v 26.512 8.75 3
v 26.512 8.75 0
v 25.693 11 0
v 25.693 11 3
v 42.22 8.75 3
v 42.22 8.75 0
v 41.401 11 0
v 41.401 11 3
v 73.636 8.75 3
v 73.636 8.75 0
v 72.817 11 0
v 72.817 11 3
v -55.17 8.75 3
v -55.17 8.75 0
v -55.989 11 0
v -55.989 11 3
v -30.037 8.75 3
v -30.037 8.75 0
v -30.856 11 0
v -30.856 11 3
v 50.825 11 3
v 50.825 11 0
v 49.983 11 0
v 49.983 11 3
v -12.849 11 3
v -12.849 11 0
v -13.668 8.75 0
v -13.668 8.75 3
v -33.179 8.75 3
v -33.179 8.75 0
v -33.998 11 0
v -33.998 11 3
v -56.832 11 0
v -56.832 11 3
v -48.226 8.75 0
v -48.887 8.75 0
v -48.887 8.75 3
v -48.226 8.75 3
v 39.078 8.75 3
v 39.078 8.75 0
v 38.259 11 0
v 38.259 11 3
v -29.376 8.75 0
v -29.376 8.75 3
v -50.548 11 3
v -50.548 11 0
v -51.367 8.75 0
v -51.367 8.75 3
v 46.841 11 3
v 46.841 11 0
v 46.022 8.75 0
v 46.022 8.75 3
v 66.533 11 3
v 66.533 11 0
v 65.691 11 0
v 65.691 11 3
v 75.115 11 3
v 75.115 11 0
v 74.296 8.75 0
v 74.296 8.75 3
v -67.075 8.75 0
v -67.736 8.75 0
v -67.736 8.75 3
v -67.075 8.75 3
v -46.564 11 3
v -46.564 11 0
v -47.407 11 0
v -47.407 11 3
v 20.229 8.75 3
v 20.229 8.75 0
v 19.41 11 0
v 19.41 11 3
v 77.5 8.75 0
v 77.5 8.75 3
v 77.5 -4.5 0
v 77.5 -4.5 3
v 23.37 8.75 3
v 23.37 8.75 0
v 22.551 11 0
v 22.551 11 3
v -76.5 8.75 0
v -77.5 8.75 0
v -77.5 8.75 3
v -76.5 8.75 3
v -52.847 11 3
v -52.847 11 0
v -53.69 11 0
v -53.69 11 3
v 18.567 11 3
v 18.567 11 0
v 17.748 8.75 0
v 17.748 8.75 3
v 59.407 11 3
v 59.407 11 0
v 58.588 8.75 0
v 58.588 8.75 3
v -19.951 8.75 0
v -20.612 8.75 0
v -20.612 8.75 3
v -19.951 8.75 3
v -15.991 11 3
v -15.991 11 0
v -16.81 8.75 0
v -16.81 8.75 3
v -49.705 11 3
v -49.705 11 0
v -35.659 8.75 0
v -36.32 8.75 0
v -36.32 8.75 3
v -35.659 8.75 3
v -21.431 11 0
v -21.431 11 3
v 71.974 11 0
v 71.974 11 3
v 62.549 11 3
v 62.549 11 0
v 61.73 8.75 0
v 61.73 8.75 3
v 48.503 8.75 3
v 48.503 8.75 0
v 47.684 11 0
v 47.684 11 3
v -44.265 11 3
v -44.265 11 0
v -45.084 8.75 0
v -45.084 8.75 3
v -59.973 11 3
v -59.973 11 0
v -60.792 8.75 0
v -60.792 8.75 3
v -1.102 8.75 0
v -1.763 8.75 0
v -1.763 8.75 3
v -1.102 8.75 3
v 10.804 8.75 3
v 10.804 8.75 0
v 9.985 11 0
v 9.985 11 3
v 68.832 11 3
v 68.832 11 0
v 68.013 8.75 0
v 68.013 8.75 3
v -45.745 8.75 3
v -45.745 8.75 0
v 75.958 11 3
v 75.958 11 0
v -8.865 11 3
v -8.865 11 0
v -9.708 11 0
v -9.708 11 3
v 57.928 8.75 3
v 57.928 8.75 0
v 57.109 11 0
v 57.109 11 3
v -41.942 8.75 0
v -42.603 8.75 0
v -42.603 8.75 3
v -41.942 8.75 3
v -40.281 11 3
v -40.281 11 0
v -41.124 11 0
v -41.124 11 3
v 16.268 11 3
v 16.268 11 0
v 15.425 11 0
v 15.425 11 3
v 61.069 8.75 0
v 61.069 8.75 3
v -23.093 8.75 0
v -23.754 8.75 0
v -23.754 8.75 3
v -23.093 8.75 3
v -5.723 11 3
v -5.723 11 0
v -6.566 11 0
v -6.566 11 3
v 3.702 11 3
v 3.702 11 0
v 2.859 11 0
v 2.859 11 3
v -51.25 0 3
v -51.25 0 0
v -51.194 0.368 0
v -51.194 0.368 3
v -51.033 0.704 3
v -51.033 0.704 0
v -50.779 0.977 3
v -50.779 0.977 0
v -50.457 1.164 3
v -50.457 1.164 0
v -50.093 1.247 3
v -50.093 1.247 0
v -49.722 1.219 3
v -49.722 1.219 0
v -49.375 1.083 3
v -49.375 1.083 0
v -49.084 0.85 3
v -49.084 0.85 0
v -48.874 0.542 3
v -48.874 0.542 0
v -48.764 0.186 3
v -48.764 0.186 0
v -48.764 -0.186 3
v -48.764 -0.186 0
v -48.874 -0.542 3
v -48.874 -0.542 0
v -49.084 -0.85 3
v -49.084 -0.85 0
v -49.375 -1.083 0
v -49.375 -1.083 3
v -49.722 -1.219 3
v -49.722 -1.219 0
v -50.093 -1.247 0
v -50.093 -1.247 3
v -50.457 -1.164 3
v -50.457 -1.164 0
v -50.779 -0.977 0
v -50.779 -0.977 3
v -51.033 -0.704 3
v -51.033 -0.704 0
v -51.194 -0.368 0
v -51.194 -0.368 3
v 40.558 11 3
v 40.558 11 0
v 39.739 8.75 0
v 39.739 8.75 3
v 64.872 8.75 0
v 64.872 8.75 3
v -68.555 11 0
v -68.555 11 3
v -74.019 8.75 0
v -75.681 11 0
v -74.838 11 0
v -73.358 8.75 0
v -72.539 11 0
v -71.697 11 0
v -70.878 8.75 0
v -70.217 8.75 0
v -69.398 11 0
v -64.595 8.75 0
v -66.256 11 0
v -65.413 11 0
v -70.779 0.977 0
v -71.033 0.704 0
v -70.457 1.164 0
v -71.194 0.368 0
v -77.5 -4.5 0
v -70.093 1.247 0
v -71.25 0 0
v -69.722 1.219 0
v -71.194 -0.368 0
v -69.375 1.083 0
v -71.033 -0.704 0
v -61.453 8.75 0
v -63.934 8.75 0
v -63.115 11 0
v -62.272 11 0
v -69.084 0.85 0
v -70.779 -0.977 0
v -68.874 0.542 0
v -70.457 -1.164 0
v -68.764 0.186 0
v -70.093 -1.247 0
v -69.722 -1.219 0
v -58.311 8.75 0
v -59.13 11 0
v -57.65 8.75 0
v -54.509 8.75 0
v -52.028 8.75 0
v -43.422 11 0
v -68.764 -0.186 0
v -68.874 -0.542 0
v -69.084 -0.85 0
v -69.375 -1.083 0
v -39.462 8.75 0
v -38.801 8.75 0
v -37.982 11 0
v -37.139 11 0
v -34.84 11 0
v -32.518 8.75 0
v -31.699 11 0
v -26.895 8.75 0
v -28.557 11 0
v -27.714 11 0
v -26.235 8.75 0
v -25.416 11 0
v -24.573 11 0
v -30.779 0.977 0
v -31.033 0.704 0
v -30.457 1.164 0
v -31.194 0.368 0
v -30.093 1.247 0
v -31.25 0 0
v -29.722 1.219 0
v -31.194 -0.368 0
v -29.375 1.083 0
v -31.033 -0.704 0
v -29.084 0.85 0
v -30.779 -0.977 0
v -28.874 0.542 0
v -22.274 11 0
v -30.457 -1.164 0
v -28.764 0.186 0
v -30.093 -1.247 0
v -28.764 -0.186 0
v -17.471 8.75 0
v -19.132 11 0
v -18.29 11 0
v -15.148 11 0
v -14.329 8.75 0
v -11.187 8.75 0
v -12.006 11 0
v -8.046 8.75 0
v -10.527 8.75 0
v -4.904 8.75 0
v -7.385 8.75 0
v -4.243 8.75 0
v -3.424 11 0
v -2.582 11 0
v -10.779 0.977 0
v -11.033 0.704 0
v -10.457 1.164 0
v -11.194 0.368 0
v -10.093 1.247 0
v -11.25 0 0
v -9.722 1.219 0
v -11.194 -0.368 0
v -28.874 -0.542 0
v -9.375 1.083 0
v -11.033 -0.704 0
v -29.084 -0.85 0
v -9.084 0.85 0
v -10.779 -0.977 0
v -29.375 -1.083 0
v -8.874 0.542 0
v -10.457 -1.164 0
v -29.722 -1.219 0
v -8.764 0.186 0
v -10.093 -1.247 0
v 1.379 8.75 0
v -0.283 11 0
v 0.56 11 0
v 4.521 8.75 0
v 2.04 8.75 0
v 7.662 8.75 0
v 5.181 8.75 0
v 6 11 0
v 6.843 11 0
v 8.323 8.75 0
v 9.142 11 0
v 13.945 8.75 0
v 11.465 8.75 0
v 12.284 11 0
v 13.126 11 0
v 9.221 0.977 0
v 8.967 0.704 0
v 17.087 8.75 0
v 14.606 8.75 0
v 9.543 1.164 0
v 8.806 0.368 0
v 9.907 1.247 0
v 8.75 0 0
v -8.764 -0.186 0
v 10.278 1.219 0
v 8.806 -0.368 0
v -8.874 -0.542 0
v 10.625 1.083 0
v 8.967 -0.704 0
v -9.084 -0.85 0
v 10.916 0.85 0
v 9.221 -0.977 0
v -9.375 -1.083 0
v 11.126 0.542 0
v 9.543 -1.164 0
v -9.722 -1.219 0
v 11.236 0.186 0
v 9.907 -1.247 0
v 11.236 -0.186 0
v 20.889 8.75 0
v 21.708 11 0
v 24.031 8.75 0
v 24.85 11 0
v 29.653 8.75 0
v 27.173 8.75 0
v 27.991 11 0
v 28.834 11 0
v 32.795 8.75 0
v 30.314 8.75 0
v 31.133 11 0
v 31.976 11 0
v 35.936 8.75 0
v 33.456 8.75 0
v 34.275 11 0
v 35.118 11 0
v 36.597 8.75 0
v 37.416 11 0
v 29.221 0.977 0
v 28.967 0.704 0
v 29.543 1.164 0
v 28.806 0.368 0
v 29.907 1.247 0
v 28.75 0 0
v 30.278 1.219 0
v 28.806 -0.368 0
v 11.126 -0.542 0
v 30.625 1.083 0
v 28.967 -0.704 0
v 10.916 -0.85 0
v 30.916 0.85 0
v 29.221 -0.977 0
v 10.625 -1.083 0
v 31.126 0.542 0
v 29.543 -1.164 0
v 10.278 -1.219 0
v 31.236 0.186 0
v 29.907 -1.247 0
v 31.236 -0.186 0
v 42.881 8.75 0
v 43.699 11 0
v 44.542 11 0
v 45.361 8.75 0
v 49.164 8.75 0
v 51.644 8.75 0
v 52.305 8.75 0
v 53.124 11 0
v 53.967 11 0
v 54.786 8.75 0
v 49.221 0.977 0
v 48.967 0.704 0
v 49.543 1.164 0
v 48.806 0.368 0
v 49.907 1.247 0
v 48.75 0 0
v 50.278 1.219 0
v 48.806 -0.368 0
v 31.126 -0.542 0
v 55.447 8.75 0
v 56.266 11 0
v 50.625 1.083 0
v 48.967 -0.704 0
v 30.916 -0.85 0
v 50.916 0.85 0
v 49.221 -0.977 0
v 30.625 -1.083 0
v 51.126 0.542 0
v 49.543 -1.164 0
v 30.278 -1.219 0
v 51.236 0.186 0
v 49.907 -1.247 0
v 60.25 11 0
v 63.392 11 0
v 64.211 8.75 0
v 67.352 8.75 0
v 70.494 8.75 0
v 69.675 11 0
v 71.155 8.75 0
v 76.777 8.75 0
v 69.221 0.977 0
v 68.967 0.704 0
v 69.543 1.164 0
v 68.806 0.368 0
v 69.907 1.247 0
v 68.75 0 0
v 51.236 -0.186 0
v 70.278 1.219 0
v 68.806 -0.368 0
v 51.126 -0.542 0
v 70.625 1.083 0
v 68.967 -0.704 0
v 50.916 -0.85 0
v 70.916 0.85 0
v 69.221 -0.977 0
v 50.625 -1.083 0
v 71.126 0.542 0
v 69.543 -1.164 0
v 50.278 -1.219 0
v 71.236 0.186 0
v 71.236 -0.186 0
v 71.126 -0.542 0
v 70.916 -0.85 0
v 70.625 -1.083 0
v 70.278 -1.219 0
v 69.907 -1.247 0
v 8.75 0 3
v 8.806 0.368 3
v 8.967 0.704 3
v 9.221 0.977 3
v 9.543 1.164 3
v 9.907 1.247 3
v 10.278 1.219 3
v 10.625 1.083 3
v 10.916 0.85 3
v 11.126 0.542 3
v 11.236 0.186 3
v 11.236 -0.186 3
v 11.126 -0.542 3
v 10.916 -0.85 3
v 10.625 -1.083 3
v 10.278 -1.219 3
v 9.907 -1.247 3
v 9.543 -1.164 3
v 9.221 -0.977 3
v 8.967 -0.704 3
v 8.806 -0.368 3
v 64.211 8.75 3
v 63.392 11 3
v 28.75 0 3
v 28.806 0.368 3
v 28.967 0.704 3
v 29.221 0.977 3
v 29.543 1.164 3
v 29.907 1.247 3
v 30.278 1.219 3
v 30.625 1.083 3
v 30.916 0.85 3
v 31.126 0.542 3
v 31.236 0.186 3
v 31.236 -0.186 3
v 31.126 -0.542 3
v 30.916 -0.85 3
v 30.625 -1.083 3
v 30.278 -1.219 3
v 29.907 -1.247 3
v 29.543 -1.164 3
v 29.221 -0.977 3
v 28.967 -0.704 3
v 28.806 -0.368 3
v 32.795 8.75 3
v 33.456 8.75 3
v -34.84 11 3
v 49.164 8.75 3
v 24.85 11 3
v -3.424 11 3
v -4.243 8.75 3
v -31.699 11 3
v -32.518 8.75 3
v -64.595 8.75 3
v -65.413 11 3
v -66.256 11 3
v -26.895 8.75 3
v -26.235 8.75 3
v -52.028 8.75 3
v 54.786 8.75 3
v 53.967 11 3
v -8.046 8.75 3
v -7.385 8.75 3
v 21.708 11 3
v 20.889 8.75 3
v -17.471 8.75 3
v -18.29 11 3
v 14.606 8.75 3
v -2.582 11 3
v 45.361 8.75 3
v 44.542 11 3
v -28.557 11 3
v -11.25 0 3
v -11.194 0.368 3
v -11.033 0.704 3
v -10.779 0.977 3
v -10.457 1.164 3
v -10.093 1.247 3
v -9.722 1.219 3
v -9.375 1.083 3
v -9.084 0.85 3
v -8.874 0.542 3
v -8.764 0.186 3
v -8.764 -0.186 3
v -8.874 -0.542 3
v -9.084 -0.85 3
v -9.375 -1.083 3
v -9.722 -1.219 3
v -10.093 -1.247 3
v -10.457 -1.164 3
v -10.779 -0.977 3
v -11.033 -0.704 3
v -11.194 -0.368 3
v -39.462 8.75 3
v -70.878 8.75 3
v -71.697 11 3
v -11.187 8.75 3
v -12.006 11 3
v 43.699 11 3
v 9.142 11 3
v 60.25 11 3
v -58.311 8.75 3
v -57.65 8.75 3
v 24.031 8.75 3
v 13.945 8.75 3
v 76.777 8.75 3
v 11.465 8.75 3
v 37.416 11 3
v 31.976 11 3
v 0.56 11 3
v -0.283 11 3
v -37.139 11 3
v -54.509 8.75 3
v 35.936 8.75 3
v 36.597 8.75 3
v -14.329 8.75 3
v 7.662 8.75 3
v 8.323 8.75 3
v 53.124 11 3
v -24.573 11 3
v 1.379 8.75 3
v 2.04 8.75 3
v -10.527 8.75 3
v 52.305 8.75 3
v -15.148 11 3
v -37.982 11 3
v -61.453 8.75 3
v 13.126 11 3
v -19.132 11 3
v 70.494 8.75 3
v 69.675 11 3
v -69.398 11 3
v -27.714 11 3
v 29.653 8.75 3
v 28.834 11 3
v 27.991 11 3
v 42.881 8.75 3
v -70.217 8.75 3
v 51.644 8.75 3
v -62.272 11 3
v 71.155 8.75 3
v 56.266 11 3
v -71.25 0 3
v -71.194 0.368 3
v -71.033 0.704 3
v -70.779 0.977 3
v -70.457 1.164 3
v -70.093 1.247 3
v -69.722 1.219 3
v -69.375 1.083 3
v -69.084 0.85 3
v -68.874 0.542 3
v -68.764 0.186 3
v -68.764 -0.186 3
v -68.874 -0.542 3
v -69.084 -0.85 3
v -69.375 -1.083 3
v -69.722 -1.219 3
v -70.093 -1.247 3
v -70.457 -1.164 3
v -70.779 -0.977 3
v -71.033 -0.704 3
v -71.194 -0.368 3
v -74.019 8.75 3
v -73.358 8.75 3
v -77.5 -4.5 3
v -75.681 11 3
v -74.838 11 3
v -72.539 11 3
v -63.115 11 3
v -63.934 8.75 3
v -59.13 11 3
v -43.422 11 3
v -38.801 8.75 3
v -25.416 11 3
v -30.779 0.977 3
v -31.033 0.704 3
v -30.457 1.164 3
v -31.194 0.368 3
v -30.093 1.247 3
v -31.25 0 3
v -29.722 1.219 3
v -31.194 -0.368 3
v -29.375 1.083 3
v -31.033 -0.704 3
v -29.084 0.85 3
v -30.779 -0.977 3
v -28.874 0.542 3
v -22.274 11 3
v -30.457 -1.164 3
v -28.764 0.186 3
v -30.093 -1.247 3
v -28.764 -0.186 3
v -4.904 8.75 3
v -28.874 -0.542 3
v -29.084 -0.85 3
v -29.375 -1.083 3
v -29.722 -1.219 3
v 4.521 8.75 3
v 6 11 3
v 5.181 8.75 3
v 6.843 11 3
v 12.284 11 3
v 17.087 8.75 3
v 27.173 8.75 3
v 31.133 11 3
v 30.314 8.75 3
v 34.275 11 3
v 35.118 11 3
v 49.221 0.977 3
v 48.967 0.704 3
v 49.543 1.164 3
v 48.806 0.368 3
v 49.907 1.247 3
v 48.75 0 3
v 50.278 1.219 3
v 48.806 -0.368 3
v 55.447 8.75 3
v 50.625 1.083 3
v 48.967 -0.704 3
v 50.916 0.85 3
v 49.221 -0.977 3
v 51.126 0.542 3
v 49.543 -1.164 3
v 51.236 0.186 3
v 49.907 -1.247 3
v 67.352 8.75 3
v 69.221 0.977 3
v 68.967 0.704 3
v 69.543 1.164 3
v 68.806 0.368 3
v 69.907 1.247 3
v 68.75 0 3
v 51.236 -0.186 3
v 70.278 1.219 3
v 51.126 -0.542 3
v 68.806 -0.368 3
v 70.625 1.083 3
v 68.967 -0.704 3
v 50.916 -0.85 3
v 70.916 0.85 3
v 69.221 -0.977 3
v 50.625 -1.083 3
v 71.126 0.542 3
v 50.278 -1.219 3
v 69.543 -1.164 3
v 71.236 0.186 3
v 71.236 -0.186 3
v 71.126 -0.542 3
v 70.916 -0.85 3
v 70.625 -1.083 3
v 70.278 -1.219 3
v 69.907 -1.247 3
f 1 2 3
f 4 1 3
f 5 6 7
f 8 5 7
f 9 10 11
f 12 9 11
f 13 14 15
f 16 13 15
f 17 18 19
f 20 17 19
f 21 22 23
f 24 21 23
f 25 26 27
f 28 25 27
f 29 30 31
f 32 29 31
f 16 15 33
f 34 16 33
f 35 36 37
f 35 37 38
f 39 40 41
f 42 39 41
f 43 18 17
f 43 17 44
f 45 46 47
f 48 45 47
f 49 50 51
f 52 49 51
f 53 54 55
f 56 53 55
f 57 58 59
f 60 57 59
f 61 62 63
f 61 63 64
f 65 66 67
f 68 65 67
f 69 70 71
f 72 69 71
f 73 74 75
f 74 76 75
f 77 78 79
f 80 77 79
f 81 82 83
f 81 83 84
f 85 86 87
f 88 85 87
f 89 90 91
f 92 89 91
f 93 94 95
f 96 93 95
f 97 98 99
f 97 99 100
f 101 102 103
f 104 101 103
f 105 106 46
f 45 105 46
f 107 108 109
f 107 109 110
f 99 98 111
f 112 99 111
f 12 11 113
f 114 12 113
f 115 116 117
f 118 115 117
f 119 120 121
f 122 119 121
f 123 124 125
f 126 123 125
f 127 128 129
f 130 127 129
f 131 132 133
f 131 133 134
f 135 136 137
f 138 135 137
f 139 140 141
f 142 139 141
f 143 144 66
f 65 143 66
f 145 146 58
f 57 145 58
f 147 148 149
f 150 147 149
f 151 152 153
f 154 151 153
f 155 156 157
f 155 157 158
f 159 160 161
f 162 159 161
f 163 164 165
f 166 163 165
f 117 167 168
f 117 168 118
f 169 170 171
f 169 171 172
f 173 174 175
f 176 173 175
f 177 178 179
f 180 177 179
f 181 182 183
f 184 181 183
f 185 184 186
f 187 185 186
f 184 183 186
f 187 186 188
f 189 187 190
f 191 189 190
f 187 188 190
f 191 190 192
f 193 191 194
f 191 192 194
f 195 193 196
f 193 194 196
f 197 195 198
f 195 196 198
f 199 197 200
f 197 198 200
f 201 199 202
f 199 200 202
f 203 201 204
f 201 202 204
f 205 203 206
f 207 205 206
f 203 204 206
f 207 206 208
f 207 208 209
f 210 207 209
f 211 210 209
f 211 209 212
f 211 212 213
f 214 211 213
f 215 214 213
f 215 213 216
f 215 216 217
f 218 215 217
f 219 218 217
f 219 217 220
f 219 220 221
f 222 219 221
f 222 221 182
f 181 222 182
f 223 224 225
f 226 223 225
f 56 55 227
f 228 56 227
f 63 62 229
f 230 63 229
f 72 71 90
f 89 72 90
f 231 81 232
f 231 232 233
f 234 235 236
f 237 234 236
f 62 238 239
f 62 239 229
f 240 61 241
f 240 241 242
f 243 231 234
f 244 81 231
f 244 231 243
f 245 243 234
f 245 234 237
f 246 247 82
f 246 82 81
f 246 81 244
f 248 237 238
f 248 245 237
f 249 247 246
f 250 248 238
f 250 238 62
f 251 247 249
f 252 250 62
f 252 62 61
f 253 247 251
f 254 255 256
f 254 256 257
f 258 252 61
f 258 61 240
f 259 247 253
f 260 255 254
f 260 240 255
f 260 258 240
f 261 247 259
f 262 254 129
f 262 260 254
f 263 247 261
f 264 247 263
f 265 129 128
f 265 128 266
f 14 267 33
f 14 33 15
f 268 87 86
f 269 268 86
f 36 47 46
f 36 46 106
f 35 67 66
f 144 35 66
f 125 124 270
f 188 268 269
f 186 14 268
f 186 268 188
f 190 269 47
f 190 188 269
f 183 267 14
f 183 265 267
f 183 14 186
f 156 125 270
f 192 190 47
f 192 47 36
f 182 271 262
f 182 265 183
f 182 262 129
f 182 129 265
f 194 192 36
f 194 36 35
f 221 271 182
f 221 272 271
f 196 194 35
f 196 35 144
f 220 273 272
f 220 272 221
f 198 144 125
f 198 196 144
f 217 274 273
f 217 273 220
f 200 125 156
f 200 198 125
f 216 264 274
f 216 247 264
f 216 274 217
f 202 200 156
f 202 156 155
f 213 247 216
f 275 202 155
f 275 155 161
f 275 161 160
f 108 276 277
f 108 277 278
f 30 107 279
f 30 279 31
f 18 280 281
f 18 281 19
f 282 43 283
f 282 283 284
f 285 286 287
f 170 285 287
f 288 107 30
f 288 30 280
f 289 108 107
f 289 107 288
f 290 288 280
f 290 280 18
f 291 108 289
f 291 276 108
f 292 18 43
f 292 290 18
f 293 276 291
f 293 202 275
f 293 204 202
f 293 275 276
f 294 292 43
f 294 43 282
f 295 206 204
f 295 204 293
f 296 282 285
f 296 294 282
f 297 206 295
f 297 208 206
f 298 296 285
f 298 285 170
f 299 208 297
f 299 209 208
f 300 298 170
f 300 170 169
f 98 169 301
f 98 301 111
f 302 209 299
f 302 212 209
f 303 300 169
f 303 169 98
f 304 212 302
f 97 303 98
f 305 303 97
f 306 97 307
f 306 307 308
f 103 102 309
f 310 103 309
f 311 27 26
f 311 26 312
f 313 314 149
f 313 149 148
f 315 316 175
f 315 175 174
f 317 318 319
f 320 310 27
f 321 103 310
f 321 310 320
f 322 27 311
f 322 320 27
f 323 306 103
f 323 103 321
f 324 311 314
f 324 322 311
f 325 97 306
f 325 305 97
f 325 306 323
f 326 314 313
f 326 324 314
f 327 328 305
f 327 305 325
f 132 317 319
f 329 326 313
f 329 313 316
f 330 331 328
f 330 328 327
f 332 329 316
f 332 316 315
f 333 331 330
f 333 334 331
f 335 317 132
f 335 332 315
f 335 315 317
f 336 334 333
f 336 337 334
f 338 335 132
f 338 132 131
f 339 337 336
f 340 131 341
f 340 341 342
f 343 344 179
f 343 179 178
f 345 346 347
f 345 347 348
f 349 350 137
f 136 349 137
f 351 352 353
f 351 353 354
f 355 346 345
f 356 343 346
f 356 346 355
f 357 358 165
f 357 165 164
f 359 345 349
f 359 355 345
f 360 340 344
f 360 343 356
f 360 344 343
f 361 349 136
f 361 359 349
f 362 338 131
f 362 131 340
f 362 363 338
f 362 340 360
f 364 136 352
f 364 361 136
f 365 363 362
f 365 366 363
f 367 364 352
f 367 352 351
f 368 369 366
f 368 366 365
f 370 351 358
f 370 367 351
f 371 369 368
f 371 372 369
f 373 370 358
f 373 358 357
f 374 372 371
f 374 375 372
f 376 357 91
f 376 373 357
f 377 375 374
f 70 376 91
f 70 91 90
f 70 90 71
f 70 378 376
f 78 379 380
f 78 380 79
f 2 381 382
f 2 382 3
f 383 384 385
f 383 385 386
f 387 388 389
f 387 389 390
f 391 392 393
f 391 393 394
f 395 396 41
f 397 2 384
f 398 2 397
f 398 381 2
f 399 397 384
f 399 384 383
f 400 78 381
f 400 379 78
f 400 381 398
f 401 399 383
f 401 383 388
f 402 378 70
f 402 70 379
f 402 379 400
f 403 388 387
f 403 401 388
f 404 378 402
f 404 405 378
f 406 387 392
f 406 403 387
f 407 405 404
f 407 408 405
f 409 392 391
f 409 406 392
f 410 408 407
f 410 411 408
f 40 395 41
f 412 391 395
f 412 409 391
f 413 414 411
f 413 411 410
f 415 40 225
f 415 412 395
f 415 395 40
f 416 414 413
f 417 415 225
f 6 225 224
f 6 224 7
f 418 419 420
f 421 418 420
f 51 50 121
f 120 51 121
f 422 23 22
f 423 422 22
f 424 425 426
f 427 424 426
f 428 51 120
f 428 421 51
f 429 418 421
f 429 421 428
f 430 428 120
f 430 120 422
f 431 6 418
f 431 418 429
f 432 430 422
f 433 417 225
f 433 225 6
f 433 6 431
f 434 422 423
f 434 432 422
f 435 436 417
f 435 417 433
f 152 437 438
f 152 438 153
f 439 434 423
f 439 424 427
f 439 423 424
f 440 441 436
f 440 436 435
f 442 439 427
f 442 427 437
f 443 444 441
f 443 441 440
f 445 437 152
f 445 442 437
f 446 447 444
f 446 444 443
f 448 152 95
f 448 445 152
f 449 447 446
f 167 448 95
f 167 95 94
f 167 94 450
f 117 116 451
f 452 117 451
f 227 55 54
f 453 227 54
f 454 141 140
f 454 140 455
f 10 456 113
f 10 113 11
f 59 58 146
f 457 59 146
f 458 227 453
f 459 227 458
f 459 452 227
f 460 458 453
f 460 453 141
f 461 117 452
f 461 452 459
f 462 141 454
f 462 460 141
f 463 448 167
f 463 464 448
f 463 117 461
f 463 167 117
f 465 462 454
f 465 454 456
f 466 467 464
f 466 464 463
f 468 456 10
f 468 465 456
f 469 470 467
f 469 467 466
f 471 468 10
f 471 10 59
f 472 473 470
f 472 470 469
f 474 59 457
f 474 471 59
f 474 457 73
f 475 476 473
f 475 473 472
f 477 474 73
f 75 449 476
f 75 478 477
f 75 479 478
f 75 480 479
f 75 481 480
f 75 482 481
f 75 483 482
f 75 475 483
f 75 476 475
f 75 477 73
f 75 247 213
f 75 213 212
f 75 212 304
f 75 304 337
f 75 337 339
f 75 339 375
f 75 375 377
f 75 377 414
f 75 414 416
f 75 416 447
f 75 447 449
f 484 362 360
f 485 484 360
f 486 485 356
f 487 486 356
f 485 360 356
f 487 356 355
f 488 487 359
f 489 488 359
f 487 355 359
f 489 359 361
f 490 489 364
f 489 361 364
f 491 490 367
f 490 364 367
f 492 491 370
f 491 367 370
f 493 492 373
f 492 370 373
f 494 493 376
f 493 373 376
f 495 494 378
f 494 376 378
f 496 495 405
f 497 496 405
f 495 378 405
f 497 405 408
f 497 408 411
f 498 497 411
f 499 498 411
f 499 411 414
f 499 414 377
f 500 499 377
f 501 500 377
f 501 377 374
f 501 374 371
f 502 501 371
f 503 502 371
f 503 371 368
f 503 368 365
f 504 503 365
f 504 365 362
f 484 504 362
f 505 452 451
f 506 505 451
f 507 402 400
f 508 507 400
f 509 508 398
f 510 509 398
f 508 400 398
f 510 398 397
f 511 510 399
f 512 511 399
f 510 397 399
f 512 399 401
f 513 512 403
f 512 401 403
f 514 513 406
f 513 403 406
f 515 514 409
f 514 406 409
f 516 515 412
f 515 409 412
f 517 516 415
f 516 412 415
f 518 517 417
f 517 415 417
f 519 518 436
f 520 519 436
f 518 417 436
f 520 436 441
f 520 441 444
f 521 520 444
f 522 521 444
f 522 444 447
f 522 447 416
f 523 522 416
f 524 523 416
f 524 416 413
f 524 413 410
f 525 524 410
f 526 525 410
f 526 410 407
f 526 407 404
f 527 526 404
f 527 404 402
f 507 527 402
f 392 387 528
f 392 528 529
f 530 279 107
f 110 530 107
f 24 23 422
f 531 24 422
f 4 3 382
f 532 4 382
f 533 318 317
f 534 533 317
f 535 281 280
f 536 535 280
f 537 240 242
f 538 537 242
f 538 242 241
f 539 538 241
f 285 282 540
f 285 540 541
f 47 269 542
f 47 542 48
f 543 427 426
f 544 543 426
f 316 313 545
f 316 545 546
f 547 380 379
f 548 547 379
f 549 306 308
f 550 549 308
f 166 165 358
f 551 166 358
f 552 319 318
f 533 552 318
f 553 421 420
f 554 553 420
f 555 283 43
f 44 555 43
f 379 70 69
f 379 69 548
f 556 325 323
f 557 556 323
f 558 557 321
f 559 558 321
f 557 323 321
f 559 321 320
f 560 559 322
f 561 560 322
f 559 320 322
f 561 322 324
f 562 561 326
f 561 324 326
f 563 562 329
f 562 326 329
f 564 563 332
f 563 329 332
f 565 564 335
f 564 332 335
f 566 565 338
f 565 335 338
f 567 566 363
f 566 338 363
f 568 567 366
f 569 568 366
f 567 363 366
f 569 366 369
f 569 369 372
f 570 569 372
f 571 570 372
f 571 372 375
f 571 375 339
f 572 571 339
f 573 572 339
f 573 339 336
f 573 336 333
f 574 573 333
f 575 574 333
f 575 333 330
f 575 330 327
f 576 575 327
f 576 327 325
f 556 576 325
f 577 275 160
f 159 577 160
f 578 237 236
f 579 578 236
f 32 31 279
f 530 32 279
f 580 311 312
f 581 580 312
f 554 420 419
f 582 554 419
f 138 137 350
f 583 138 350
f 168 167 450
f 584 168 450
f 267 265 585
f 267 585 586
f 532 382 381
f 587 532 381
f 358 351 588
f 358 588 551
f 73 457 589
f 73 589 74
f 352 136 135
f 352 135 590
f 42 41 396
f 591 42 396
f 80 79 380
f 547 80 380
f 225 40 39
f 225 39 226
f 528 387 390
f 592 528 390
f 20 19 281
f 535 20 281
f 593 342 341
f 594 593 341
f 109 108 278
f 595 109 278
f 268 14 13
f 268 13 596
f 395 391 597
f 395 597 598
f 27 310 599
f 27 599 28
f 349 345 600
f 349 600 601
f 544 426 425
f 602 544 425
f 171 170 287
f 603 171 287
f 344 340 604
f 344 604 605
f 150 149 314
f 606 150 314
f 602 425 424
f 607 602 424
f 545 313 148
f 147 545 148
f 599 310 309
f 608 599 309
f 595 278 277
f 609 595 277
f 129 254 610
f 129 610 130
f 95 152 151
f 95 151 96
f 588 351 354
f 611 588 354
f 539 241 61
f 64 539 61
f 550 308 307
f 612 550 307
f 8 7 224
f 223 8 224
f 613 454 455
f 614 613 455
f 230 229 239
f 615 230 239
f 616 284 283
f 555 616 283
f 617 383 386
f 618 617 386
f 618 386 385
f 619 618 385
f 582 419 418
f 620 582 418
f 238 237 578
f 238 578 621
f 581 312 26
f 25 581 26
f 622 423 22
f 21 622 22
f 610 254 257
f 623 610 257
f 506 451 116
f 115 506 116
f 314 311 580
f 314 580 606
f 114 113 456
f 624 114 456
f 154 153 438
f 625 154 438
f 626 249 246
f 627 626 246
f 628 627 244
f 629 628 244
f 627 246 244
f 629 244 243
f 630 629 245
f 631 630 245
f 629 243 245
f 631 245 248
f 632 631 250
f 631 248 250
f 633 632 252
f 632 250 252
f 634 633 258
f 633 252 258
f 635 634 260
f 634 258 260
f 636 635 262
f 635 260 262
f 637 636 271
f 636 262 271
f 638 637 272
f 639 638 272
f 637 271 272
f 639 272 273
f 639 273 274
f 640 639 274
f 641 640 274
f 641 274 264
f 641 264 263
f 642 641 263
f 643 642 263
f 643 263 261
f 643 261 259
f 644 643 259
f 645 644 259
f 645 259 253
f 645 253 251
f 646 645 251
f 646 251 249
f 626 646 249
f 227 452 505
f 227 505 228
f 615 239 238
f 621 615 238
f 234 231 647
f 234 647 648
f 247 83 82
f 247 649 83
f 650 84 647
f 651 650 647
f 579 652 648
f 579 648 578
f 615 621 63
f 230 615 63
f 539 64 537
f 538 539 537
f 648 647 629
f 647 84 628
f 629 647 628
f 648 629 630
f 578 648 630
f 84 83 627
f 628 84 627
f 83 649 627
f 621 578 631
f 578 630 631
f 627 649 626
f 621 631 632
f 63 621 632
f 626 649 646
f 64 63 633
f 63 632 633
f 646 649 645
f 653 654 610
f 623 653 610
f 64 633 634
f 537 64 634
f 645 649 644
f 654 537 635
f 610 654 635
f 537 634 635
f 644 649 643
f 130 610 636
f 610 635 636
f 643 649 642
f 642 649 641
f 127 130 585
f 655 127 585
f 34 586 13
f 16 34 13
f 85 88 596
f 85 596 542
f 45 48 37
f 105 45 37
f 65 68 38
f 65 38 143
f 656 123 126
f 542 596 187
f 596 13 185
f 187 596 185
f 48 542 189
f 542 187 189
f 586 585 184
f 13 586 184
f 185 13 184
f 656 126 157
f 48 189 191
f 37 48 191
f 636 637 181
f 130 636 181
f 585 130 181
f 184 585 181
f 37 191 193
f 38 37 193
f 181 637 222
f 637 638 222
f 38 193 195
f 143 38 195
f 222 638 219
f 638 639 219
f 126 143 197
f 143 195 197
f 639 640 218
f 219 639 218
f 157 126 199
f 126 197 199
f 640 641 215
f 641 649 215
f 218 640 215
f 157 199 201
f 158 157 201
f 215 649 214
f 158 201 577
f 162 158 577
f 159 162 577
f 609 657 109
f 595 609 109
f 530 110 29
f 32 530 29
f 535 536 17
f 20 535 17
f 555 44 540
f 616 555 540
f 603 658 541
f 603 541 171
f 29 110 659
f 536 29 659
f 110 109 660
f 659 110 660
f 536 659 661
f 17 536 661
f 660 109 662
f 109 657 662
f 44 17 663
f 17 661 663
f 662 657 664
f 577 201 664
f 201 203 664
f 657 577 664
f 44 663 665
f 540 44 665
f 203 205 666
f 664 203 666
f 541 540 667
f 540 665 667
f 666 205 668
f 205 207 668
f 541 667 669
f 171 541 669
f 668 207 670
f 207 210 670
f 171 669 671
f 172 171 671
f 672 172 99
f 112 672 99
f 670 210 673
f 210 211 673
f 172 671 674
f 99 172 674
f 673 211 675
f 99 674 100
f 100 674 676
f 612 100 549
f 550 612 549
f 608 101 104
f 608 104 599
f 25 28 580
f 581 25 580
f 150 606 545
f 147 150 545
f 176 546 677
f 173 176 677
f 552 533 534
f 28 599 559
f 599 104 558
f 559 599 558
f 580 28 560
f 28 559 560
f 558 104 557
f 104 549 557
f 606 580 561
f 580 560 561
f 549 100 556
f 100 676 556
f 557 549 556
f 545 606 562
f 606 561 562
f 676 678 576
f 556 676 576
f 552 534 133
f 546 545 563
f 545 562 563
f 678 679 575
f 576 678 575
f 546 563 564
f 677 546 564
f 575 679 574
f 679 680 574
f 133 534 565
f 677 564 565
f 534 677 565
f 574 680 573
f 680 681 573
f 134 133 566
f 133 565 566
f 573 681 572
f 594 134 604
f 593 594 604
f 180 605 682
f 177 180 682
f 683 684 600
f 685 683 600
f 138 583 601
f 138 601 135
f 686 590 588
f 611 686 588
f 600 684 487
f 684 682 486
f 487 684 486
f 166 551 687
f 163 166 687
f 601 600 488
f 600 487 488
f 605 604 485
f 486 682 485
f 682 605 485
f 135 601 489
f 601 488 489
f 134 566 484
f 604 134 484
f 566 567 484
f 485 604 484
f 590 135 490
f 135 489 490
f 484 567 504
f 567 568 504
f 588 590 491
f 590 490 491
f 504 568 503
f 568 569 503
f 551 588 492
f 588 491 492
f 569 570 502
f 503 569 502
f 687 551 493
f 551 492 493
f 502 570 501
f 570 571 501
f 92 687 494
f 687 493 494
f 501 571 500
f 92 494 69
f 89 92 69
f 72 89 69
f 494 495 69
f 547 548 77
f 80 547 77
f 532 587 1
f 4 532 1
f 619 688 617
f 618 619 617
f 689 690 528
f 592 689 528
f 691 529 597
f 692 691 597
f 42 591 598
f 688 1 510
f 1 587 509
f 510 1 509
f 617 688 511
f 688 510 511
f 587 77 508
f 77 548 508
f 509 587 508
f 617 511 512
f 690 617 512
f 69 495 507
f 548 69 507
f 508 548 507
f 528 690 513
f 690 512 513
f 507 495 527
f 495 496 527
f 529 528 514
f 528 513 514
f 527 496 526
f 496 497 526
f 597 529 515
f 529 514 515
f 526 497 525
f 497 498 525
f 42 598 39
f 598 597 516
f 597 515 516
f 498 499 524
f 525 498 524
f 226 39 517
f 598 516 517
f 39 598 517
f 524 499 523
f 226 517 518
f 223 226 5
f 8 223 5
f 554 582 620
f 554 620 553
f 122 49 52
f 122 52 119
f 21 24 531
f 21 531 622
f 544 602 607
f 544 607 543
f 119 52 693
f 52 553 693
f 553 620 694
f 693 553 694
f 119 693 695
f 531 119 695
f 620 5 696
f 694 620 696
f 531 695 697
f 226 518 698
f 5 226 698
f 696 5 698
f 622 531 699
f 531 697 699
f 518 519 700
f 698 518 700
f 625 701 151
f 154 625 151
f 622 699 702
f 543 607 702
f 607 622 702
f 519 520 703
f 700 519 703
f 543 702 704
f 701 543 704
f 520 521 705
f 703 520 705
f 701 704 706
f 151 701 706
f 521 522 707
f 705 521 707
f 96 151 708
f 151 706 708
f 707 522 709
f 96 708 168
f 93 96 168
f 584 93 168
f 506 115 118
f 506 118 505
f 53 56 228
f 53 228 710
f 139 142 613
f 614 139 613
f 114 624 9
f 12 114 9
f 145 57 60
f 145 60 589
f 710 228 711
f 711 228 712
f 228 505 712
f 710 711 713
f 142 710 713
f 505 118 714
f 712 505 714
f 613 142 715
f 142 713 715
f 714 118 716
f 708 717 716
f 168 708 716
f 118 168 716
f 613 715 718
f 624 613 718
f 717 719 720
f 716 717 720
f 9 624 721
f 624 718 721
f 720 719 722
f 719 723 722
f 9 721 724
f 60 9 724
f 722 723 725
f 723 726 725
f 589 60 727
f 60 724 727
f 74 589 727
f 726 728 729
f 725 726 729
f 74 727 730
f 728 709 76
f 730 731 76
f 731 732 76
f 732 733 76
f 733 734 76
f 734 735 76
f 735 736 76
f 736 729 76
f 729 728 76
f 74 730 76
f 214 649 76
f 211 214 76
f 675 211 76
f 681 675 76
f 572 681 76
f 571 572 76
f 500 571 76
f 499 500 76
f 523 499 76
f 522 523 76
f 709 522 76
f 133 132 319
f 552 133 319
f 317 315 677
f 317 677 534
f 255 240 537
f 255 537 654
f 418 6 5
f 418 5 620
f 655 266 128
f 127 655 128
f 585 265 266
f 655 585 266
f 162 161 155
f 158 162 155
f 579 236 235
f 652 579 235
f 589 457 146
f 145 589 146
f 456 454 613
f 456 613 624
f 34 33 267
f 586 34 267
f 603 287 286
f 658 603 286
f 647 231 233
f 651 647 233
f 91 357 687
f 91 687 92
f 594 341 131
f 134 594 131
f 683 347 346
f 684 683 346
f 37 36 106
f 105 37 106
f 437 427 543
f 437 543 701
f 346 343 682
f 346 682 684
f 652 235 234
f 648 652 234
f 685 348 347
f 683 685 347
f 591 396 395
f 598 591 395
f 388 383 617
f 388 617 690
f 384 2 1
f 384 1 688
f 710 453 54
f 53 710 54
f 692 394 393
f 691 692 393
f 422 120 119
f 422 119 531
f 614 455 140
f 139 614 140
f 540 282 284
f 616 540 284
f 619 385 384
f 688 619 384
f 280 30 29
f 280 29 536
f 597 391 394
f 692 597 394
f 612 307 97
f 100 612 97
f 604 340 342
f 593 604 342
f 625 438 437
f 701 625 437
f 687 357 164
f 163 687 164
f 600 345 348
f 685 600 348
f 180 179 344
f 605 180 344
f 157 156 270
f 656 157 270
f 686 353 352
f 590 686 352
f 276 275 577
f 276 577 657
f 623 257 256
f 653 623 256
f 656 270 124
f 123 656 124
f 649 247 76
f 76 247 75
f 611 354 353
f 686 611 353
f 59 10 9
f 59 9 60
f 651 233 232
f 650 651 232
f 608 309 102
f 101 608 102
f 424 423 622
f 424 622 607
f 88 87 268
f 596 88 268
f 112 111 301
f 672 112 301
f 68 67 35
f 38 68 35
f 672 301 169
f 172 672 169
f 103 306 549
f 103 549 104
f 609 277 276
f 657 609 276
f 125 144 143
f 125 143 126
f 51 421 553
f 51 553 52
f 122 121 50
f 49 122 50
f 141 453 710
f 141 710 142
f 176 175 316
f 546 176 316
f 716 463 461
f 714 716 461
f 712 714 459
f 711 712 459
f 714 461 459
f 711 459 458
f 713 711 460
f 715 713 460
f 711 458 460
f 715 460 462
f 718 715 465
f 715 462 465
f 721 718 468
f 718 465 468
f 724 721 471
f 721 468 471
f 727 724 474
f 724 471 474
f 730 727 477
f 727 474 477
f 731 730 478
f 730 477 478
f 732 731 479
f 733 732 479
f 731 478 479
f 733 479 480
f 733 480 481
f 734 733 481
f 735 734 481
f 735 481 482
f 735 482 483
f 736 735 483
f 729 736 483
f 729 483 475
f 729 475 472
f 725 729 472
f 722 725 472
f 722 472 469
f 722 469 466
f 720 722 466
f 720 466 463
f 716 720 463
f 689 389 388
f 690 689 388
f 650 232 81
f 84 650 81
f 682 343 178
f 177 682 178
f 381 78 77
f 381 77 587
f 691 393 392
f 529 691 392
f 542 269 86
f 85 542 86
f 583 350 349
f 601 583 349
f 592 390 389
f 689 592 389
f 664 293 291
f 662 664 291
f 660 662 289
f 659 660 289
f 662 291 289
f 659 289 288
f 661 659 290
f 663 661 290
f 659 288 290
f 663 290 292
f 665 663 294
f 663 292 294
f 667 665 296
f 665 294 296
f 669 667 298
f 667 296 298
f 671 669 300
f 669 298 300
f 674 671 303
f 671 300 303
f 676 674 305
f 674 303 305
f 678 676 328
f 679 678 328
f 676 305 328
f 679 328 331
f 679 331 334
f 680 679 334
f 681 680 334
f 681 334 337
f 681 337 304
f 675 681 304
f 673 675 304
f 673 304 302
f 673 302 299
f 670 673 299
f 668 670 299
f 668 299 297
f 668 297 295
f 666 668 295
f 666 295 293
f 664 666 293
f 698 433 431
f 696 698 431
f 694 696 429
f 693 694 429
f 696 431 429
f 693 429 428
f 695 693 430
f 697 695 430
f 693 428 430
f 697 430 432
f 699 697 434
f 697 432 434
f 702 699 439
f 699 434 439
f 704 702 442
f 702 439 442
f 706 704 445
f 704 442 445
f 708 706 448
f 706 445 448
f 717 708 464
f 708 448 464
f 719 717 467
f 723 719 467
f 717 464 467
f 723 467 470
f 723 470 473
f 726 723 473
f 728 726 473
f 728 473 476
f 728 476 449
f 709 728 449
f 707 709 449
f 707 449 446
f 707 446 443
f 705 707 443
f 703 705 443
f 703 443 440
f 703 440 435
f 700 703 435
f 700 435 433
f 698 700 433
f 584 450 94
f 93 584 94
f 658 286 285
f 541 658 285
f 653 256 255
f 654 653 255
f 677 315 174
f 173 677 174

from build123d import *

# Parameters (mm, degrees)
SKETCH_1_W             = 155
SKETCH_1_H             = 9
EXTRUDE_1_DEPTH        = 3
SKETCH_3_W             = 155
SKETCH_3_H             = 3
EXTRUDE_2_DEPTH        = 4.25
EXTRUDE_3_DEPTH        = 3
M3X0_5_1_D             = 2.5
PATTERN_LINEAR_1_COUNT = 49
PATTERN_LINEAR_1_PITCH = 3.141592654
PATTERN_LINEAR_2_COUNT = 8
PATTERN_LINEAR_2_PITCH = 20


with BuildPart() as part:
    # 草圖1 → 填料-伸長1 (new body)
    with BuildSketch(Plane.XY):
        Rectangle(SKETCH_1_W, SKETCH_1_H)
    extrude(amount=EXTRUDE_1_DEPTH)

    # 草圖3 → 填料-伸長2 (add)
    with BuildSketch(Plane(origin=(0, 4.5, 0), x_dir=(1, 0, 0), z_dir=(0, 1, 0))):
        with Locations((0, -1.5)):
            Rectangle(SKETCH_3_W, SKETCH_3_H)
    extrude(amount=EXTRUDE_2_DEPTH)

    # 草圖4 → 填料-伸長3 (add, through all)
    with BuildSketch(Plane.XY):
        Polygon((-76.5, 8.75), (-74.019278088, 8.75), (-74.838211115, 11), (-75.681066973, 11), align=None)
    extrude_3 = extrude(amount=EXTRUDE_3_DEPTH)

    # M3x0.5 螺紋孔1 (through all)
    with Locations(Plane.XY.offset(3)):
        with Locations((-70, 0)):
            m3x0_5_1 = Hole(M3X0_5_1_D / 2)

    # 直線複製排列1: 填料-伸長3 ×49
    with Locations(*[(i * PATTERN_LINEAR_1_PITCH, 0, 0) for i in range(1, PATTERN_LINEAR_1_COUNT)]):
        add(extrude_3)

    # 直線複製排列2: M3x0.5 螺紋孔1 ×8
    with Locations(*[(i * PATTERN_LINEAR_2_PITCH, 0, 0) for i in range(1, PATTERN_LINEAR_2_COUNT)]):
        add(m3x0_5_1, mode=Mode.SUBTRACT)


solid = part.part
